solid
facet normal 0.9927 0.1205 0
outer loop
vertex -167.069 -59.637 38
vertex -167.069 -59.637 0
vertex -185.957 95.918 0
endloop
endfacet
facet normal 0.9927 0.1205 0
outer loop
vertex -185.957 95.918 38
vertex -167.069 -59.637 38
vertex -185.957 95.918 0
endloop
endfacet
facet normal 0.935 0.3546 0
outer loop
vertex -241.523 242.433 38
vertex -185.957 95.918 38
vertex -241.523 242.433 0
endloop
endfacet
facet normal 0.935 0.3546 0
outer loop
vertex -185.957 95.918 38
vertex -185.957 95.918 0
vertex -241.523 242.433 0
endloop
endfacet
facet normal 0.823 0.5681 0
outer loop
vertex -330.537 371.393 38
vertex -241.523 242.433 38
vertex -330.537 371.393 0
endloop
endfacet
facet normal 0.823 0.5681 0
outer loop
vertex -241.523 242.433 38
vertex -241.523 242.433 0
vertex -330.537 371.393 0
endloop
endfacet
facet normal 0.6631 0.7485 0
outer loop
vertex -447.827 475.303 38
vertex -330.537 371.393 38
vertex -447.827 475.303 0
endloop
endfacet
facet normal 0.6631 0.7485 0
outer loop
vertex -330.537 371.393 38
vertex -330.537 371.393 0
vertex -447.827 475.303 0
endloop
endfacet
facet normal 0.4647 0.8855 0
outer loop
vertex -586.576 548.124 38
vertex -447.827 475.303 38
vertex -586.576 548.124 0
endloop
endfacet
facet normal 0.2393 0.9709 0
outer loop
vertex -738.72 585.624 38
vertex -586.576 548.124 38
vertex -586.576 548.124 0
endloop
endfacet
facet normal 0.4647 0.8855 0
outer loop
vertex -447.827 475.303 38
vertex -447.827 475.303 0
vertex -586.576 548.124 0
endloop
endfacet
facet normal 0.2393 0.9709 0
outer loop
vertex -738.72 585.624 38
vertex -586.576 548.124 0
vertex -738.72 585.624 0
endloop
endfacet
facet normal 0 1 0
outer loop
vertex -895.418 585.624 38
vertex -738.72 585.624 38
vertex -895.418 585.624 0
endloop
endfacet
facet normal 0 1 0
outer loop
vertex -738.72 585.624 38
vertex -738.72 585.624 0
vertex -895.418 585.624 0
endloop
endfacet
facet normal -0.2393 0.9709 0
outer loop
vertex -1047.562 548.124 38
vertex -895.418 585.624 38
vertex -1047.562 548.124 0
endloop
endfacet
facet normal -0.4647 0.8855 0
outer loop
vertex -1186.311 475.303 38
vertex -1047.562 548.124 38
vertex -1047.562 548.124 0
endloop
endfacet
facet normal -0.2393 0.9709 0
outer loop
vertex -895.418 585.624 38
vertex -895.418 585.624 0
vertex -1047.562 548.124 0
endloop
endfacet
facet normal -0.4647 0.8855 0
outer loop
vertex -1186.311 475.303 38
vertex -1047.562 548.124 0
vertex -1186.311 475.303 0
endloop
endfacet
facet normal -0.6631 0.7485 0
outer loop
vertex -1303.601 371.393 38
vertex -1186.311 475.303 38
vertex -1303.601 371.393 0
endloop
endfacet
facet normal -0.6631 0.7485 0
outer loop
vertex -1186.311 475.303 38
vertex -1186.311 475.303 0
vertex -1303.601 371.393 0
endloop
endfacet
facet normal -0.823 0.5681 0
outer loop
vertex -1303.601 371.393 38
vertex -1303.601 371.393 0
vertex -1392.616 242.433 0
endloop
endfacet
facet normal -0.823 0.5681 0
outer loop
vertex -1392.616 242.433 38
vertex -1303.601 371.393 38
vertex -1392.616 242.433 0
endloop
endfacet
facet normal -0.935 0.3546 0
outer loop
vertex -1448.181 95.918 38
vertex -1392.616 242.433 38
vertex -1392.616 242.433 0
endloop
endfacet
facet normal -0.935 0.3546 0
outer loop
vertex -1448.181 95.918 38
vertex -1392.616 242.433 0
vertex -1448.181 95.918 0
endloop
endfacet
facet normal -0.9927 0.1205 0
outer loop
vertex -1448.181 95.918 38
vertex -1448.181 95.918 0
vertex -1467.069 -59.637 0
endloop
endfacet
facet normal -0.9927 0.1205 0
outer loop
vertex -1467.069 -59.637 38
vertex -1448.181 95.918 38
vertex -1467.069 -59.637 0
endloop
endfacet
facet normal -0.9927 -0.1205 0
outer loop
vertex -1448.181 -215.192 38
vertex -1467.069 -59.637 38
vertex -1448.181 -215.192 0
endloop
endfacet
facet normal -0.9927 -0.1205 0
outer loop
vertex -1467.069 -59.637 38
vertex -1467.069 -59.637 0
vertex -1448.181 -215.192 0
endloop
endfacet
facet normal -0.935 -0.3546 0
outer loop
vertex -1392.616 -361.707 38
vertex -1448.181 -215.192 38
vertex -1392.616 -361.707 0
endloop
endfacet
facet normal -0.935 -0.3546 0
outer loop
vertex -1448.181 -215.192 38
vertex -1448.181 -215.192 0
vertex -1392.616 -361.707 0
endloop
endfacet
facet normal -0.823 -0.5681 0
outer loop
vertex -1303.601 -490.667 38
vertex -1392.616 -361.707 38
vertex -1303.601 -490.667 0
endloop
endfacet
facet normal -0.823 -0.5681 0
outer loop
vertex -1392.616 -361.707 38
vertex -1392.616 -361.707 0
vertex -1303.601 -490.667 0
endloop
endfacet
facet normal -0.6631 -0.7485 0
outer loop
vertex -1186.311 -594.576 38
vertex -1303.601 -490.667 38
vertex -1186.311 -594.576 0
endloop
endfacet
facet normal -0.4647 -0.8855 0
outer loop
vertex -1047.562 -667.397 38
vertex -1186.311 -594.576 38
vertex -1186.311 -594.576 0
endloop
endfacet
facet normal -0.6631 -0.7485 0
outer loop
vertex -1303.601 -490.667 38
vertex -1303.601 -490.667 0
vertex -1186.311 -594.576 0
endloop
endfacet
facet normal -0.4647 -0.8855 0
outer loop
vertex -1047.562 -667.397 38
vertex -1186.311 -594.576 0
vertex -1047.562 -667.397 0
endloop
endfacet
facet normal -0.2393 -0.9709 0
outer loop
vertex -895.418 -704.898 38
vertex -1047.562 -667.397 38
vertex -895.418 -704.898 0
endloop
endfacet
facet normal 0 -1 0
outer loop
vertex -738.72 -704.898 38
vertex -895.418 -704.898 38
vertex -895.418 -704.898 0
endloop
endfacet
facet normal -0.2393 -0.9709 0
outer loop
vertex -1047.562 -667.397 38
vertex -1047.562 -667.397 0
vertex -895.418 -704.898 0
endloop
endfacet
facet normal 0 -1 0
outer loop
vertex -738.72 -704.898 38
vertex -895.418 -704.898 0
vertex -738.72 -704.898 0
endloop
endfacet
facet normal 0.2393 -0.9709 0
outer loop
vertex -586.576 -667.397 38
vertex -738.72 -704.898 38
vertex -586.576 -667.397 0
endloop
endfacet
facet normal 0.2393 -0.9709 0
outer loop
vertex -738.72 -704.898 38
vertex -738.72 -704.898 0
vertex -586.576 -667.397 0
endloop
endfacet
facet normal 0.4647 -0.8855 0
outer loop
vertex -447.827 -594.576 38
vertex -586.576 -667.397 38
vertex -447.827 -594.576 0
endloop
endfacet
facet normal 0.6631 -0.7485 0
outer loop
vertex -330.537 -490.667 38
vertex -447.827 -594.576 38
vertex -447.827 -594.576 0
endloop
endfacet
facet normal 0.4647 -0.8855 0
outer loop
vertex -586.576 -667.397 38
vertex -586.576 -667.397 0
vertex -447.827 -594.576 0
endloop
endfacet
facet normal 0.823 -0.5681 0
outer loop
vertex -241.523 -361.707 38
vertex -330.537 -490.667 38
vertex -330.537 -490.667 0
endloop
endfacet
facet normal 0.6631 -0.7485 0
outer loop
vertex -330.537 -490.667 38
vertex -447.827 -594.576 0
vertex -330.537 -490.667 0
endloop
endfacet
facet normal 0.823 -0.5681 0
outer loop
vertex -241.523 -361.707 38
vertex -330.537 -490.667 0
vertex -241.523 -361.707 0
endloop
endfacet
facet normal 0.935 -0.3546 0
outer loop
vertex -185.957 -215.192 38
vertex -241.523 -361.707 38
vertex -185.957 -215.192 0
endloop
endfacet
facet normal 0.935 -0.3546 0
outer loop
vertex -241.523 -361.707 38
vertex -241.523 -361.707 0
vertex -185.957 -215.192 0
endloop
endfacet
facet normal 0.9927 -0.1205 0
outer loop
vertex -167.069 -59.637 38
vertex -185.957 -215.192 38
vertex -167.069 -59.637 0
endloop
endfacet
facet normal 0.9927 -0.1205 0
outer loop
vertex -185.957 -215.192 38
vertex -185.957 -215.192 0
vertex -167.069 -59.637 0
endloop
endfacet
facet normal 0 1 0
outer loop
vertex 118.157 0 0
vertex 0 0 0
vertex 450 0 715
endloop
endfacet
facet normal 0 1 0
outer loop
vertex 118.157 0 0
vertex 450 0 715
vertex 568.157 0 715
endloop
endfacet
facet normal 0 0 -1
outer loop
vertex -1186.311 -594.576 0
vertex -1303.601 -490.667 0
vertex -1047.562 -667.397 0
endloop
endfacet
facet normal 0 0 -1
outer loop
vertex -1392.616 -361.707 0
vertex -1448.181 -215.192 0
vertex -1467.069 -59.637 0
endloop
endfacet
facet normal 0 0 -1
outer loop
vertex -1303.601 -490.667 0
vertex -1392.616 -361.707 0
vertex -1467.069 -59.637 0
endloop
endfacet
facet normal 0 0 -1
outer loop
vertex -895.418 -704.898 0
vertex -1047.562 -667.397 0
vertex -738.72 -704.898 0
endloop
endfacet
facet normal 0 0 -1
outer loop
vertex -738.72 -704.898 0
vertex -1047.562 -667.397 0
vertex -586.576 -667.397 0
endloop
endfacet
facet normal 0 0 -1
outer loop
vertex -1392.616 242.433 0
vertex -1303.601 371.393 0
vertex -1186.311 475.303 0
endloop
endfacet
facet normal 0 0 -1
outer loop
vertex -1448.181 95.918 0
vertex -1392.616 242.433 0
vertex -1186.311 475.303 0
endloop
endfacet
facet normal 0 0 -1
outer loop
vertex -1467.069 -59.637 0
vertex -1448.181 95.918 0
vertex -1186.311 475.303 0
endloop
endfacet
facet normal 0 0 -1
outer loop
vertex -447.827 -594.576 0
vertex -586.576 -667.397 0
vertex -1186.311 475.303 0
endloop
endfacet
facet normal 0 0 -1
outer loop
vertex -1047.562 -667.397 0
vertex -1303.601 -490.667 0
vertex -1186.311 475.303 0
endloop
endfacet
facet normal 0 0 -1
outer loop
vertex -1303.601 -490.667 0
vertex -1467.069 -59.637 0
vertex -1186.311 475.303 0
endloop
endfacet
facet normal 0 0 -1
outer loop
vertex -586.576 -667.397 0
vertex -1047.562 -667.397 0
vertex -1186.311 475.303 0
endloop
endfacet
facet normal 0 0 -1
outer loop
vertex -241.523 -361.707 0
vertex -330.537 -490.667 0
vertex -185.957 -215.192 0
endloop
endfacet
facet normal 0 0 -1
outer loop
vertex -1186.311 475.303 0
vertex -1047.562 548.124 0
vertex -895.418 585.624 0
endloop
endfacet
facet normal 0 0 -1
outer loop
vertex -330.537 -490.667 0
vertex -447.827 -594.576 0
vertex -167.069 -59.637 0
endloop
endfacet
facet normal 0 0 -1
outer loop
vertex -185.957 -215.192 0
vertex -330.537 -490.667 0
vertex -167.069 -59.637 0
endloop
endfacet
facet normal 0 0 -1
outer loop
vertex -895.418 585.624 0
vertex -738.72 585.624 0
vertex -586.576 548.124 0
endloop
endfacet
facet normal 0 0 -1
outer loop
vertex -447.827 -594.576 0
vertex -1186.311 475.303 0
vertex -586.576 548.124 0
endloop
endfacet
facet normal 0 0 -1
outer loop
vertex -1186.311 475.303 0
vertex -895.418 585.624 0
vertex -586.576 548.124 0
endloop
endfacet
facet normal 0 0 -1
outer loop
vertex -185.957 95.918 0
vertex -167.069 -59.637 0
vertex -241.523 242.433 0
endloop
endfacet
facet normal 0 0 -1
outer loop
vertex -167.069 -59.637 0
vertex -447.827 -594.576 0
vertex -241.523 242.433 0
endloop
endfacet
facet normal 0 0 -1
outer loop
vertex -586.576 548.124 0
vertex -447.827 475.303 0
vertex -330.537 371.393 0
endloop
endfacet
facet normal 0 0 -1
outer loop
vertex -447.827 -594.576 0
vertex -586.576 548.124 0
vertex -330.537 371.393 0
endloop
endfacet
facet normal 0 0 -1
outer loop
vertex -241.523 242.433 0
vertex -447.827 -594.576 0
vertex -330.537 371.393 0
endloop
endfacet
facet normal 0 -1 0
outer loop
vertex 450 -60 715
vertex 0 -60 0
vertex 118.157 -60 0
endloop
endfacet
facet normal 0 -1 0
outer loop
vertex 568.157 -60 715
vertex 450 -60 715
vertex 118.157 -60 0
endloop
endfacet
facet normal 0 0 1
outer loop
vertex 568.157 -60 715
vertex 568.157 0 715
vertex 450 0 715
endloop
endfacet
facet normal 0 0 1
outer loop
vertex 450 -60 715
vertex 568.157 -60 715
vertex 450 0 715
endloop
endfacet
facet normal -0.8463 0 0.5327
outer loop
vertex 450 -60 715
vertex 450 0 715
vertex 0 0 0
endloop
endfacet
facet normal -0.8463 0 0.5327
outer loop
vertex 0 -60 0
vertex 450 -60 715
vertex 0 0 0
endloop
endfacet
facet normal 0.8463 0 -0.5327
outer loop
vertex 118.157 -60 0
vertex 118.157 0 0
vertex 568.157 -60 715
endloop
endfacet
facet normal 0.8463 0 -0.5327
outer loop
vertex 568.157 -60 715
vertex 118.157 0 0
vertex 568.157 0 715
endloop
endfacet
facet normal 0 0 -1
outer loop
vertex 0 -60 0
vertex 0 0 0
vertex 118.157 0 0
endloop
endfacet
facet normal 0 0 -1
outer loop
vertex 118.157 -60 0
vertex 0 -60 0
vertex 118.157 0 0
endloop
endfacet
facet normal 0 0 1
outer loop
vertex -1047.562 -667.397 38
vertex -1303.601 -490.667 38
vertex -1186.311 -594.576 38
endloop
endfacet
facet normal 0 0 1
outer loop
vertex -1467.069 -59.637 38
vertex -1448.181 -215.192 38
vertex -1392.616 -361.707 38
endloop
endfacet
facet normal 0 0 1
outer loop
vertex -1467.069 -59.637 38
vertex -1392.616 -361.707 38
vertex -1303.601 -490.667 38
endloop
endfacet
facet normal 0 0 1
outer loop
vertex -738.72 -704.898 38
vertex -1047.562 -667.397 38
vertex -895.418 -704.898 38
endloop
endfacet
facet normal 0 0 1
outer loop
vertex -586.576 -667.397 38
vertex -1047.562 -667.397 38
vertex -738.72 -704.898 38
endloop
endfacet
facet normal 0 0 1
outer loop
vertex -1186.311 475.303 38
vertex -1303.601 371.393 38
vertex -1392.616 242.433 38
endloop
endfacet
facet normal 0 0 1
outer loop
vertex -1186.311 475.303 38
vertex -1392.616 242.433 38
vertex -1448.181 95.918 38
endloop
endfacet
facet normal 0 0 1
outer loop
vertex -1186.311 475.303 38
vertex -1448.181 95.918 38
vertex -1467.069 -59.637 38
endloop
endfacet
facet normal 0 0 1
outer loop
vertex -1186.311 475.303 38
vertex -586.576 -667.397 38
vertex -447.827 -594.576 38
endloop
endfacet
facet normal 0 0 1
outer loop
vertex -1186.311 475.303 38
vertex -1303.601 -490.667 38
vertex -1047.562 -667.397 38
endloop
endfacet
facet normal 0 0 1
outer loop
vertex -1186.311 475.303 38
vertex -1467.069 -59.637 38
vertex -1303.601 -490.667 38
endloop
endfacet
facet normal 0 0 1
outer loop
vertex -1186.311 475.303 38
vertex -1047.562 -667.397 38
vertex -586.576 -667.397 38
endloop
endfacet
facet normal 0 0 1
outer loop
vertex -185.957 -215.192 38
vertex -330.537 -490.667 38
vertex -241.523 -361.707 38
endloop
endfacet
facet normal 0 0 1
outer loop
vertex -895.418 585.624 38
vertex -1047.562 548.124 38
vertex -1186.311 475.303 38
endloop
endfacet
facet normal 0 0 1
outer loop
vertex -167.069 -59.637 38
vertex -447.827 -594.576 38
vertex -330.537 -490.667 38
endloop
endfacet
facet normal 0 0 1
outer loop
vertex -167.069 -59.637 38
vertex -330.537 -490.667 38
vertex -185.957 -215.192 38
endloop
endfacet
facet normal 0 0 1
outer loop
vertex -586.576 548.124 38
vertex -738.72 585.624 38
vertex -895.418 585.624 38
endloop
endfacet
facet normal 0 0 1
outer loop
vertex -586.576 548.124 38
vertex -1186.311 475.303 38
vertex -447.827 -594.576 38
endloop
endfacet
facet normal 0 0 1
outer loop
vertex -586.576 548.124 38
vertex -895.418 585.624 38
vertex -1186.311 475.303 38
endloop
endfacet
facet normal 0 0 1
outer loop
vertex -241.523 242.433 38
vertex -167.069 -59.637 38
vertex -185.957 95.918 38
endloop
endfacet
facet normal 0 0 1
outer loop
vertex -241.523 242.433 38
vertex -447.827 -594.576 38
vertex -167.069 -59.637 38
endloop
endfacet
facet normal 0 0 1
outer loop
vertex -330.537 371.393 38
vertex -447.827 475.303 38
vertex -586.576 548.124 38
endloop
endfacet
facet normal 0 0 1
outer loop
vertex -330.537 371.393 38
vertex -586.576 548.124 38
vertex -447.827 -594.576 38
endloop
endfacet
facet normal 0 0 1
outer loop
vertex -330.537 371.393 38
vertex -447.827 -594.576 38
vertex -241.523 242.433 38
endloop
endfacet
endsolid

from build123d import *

# Parameters (mm, degrees)
F1_DEPTH = 60
F2_R     = 650
F3_DEPTH = 38


with BuildPart() as f1:
    # F0 (on Front) → F1 (new body)
    with BuildSketch(Plane.XZ):
        Polygon((450, 715), (0, 0), (118.156988, 0), (568.156988, 715), align=None)
    extrude(amount=F1_DEPTH)


with BuildPart() as f3:
    # F2 (on Top) → F3 (new body)
    with BuildSketch(Plane.XY):
        with Locations((-817.069113, -59.63679)):
            Circle(F2_R)
    extrude(amount=F3_DEPTH)


solid = Compound([f1.part, f3.part])
